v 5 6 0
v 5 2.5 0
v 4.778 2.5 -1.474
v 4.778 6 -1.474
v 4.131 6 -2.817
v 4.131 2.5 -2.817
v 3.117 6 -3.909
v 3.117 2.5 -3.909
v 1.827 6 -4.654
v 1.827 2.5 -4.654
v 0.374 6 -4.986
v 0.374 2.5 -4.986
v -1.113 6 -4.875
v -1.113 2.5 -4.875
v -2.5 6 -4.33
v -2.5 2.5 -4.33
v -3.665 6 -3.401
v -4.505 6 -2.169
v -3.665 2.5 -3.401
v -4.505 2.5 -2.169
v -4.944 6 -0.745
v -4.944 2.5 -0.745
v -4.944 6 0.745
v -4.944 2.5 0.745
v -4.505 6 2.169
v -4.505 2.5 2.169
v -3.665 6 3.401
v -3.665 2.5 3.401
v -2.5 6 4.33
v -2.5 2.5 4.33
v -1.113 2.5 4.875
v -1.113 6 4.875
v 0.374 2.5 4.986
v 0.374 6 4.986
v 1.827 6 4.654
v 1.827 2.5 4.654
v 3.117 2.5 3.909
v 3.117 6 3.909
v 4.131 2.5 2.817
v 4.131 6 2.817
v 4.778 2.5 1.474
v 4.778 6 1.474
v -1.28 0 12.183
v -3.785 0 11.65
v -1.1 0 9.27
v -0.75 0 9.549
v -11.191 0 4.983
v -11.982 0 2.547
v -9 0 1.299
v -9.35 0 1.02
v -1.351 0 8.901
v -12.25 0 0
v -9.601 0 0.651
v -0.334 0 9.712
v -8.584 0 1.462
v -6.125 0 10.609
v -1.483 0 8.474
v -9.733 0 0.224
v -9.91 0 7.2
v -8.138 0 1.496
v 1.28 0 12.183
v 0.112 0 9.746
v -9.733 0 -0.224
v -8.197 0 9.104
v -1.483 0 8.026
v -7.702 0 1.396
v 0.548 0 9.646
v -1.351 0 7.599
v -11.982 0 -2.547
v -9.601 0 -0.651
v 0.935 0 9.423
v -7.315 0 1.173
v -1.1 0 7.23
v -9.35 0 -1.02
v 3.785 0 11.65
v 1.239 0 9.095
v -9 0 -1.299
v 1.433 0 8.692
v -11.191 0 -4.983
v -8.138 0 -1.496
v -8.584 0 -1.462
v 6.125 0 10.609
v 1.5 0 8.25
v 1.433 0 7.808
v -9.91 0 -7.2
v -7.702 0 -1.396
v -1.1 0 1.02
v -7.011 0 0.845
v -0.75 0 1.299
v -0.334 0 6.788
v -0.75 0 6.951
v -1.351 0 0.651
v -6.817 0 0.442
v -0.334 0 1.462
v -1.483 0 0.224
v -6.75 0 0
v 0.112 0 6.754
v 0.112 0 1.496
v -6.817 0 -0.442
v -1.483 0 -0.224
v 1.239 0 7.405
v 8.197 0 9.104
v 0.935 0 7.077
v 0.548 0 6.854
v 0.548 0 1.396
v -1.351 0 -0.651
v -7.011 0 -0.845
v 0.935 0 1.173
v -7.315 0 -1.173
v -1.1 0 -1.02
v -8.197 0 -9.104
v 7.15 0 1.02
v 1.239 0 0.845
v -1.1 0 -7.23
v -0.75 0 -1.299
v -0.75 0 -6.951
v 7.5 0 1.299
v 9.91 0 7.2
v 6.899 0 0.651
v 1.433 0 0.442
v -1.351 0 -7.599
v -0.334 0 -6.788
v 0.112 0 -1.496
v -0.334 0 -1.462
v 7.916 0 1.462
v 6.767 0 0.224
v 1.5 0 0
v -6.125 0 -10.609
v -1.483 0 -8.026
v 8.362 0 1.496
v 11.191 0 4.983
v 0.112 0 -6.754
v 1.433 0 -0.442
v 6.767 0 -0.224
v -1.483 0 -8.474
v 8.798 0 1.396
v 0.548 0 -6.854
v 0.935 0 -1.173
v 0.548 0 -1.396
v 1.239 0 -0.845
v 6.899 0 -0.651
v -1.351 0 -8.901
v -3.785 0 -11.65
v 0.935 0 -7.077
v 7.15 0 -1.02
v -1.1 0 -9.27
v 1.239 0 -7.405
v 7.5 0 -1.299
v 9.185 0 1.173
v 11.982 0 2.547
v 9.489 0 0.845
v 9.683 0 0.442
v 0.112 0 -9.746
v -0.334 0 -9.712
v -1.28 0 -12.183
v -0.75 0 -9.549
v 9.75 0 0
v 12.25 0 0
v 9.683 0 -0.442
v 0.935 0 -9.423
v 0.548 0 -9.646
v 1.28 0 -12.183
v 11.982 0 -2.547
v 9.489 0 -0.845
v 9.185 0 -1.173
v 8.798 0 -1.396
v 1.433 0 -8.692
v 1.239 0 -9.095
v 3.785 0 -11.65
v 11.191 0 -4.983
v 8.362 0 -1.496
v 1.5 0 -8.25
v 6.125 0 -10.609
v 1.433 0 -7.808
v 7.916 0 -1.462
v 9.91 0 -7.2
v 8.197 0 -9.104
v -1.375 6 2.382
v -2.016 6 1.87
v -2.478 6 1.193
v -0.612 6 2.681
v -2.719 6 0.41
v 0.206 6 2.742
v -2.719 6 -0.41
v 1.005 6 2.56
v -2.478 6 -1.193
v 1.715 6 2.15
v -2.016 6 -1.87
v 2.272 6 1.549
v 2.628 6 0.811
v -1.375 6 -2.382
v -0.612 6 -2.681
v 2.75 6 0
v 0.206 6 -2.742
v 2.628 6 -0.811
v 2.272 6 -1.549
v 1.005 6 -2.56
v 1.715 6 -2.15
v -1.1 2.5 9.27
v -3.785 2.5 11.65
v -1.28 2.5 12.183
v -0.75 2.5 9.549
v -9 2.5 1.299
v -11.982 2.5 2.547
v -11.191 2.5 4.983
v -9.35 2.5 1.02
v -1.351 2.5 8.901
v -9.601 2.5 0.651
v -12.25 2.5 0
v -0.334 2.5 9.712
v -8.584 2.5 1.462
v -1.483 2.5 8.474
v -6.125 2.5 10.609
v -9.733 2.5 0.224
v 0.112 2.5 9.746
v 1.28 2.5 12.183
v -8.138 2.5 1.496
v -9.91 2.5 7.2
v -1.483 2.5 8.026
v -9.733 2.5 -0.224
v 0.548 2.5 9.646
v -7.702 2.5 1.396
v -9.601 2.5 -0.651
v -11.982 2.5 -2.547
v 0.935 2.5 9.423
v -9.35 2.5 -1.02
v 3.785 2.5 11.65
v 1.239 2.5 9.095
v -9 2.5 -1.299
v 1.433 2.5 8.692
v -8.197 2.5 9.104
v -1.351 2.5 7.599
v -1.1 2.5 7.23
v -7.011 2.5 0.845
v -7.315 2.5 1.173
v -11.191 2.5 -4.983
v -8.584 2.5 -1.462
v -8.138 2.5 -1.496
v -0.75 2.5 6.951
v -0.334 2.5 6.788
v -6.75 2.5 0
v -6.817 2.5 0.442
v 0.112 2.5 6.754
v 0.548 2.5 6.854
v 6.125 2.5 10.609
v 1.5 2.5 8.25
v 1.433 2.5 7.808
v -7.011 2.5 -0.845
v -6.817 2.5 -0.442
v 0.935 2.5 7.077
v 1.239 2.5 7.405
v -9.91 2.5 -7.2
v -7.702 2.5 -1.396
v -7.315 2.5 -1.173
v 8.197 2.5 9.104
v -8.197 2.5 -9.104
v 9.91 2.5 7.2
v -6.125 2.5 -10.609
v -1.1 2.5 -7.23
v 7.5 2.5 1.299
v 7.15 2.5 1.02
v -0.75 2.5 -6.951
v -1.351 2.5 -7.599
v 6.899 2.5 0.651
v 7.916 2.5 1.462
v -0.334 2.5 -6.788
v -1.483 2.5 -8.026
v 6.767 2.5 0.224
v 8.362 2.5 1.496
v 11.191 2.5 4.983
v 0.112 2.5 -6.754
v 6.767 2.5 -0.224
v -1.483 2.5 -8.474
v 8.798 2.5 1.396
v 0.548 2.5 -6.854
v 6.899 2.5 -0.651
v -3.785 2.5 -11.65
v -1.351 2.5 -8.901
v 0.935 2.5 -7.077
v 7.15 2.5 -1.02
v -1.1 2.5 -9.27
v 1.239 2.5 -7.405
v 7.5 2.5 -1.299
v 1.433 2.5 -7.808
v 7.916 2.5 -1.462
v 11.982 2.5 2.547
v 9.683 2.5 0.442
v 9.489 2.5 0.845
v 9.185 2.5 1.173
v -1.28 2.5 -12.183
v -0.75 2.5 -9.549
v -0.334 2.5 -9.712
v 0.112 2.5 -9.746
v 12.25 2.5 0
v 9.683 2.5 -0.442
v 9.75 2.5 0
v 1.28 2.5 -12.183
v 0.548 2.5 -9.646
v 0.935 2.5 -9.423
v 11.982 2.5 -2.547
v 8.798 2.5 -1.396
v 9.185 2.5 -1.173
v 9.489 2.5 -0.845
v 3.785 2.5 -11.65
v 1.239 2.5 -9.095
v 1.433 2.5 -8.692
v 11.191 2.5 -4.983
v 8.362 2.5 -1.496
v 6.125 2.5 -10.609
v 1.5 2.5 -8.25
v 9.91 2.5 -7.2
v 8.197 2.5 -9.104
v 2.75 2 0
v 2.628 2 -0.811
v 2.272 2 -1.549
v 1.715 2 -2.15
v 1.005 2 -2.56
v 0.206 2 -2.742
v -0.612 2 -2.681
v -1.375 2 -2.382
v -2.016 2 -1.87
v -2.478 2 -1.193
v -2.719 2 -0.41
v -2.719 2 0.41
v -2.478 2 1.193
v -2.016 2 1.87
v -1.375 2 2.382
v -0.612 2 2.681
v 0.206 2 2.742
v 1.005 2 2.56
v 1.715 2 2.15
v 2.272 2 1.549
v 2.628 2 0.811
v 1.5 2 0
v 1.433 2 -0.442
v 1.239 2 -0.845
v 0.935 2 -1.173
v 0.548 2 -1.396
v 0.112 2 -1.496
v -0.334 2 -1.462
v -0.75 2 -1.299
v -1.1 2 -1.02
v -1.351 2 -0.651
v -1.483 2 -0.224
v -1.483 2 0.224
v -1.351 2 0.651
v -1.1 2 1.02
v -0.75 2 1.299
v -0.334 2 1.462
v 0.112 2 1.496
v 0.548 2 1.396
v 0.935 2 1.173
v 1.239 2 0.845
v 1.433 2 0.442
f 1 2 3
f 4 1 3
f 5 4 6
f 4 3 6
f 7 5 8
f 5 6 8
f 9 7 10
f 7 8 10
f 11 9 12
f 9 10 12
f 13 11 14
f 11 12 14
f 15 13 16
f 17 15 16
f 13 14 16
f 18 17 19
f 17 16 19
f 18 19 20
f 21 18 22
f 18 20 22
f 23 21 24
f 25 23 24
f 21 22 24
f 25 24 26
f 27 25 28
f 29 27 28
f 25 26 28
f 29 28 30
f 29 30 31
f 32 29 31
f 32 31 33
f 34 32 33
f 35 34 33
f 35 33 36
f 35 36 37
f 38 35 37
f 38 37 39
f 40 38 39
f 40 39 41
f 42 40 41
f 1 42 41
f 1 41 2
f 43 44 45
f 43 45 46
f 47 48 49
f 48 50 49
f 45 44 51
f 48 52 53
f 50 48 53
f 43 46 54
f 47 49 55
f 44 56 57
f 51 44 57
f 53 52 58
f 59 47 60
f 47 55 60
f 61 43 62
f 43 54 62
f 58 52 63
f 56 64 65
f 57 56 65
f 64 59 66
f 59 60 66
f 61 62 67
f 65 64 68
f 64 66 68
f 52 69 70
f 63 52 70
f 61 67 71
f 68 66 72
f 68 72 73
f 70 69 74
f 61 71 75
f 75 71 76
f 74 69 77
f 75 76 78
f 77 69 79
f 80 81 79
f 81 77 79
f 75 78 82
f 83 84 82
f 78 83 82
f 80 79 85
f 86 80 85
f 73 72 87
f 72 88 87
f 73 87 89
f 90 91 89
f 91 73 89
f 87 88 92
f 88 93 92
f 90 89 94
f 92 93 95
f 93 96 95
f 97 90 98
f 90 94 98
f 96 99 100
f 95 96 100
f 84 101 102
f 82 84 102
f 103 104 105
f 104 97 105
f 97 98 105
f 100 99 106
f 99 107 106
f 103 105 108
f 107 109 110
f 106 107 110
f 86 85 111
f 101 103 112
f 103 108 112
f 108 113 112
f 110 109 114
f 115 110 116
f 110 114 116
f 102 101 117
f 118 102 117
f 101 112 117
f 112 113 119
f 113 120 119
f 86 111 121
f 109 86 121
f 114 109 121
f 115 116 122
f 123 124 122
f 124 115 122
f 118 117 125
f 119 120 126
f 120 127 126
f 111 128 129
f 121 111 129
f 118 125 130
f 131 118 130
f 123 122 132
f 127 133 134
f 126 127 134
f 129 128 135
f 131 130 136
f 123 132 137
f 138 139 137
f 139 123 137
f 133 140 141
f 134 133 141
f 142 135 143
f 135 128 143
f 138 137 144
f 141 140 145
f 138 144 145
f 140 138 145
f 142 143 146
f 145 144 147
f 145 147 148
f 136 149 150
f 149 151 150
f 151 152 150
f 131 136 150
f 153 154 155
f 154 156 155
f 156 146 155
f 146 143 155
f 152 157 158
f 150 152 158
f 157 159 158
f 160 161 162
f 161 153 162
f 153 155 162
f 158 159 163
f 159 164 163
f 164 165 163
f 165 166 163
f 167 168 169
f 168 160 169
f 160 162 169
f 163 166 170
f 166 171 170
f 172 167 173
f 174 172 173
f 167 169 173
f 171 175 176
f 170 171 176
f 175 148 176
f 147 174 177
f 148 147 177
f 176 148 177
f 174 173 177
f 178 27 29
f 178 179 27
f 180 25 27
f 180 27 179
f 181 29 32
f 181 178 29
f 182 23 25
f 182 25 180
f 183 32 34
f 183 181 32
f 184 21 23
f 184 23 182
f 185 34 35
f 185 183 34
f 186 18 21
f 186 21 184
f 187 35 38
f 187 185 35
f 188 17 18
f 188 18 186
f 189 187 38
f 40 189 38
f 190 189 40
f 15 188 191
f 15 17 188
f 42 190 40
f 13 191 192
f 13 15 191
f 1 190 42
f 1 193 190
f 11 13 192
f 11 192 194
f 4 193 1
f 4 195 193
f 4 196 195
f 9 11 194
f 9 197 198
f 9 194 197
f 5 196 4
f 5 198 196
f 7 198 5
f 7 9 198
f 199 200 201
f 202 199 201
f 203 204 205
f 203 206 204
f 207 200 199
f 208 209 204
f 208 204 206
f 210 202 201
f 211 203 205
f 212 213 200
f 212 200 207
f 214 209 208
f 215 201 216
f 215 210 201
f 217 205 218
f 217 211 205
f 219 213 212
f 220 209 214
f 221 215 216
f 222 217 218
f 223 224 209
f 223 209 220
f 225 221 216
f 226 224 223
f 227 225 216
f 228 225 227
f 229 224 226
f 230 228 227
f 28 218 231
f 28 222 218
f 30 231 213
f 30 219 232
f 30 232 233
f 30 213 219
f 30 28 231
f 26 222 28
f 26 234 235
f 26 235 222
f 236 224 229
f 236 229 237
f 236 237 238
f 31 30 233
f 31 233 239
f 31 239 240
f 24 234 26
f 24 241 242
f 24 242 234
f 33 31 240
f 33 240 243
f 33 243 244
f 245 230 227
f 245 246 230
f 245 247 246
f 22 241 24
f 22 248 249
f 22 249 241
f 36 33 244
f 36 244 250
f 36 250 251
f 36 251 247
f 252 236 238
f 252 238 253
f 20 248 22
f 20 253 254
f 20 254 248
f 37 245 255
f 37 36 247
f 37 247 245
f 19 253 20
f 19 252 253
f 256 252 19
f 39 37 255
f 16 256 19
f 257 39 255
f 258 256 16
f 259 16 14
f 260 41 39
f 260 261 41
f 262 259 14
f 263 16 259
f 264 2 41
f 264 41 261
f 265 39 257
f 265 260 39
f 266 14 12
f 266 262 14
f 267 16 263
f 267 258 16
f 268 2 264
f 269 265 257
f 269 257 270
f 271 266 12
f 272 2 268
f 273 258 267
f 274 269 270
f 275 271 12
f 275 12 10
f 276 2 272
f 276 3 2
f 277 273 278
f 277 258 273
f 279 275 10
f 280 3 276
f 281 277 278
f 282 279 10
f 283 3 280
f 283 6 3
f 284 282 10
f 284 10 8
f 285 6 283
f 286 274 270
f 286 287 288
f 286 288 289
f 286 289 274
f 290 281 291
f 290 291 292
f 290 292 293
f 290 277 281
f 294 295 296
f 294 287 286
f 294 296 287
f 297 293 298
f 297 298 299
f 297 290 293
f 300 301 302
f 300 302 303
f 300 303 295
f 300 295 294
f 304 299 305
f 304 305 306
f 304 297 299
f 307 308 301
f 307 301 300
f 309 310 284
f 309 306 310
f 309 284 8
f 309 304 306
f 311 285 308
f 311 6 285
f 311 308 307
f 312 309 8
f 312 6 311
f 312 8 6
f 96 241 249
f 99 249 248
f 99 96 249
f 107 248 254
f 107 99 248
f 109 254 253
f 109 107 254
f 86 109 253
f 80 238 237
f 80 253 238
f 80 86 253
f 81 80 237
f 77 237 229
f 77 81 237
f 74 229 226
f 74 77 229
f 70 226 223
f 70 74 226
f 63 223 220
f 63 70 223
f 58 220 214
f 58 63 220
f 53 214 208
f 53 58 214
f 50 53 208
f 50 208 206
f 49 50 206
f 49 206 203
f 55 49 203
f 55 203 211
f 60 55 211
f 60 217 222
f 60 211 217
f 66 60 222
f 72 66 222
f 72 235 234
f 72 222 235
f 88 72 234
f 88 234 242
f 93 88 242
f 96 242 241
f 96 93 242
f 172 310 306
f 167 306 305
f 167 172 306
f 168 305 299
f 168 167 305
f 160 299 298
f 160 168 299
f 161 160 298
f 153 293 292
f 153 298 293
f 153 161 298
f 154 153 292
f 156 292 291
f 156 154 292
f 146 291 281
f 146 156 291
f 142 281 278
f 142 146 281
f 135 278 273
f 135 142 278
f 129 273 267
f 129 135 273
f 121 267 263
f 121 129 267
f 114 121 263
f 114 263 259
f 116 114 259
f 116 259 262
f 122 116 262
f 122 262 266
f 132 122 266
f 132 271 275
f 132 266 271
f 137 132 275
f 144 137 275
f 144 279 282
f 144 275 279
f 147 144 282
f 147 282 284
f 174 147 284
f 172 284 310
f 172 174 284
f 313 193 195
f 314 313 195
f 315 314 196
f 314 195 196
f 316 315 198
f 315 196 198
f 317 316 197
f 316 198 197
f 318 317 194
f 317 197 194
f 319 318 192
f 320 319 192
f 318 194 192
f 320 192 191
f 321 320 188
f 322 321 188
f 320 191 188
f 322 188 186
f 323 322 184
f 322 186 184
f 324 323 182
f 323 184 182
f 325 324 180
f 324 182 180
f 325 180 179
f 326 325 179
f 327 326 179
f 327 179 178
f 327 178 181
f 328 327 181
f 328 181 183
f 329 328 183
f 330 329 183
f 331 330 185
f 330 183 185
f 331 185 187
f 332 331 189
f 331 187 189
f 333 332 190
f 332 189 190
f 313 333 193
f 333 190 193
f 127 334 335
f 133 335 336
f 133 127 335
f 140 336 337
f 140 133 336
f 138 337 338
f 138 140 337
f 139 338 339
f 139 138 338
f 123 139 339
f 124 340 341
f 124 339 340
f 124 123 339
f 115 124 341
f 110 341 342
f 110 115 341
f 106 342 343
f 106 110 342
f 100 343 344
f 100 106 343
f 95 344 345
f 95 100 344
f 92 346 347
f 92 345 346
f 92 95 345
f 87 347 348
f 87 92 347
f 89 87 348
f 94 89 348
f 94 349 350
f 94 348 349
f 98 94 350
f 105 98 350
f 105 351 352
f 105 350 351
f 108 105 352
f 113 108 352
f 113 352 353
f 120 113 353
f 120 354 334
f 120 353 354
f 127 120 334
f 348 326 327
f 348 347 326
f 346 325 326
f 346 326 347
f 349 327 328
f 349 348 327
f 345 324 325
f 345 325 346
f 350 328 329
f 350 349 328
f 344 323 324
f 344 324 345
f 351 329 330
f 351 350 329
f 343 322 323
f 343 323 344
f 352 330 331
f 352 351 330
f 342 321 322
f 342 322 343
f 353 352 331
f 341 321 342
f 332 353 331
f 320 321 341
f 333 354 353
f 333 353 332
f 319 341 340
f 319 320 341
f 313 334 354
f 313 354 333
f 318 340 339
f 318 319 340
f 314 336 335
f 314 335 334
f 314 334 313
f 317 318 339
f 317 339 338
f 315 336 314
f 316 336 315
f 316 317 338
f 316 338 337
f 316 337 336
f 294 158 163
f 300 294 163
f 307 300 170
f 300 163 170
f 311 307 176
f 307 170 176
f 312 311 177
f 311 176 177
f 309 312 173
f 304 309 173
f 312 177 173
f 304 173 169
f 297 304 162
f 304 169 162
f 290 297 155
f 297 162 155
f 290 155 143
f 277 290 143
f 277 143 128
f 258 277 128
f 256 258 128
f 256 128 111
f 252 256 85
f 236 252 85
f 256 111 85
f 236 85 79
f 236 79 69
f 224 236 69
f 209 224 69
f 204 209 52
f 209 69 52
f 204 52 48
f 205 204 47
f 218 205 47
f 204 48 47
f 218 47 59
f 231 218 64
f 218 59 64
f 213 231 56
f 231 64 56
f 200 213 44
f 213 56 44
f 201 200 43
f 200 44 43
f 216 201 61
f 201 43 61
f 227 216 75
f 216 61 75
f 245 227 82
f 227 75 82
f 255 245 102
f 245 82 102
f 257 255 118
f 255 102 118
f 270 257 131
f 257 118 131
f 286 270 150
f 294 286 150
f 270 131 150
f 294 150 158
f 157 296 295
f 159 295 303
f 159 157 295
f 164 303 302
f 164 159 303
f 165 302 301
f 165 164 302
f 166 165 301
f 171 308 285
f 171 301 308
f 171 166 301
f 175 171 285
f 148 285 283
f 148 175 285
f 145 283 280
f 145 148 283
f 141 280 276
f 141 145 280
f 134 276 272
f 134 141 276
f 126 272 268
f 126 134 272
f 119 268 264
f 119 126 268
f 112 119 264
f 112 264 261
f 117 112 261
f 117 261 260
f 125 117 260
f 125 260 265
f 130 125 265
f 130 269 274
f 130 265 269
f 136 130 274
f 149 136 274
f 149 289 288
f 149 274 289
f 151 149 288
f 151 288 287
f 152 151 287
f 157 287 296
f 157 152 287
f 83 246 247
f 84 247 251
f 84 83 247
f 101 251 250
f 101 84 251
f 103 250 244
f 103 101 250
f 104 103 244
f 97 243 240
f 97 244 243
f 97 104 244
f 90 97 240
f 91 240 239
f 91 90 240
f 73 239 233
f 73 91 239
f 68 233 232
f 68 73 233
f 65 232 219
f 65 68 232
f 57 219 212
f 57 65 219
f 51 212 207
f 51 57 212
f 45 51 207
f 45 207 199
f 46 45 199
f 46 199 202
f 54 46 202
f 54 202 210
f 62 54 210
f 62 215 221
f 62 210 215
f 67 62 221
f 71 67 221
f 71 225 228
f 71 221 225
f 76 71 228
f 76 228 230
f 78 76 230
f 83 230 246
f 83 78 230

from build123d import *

# Parameters (mm, degrees)
SKETCH_1_R          = 12.25
EXTRUDE_1_DEPTH     = 2.5
SKETCH_1_3_R        = 5
EXTRUDE_2_DEPTH     = 6
SKETCH_2_R          = 1.5
CUT_EXTRUDE_2_DEPTH = 6
CUT_EXTRUDE_START   = 6
SKETCH_2_3_R        = 2.75
CUT_EXTRUDE_3_DEPTH = 4


with BuildPart() as part:
    # Эскиз1 → Бобышка-Вытянуть1 (new body)
    with BuildSketch(Plane(origin=(0, 0, 0), x_dir=(1, 0, 0), z_dir=(0, 1, 0))):
        Circle(SKETCH_1_R)
    extrude(amount=EXTRUDE_1_DEPTH)

    # Эскиз1<3> → Бобышка-Вытянуть2 (add)
    with BuildSketch(Plane(origin=(0, 0, 0), x_dir=(1, 0, 0), z_dir=(0, 1, 0))):
        Circle(SKETCH_1_3_R)
    extrude(amount=EXTRUDE_2_DEPTH)

    # Эскиз2 → Вырез-Вытянуть2 (cut)
    with BuildSketch(Plane(origin=(0, 0, 0), x_dir=(1, 0, 0), z_dir=(0, 1, 0))):
        Circle(SKETCH_2_R)
        with Locations((-8.25, 0)):
            Circle(SKETCH_2_R)
        with Locations((0, 8.25)):
            Circle(SKETCH_2_R)
        with Locations((8.25, 0)):
            Circle(SKETCH_2_R)
        with Locations((0, -8.25)):
            Circle(SKETCH_2_R)
    extrude(amount=CUT_EXTRUDE_2_DEPTH, mode=Mode.SUBTRACT)

    # Эскиз2<3> → Вырез-Вытянуть3 (cut)
    with BuildSketch(Plane(origin=(0, 0, 0), x_dir=(1, 0, 0), z_dir=(0, 1, 0)).offset(CUT_EXTRUDE_START)):
        Circle(SKETCH_2_3_R)
    extrude(amount=-CUT_EXTRUDE_3_DEPTH, mode=Mode.SUBTRACT)


solid = part.part
